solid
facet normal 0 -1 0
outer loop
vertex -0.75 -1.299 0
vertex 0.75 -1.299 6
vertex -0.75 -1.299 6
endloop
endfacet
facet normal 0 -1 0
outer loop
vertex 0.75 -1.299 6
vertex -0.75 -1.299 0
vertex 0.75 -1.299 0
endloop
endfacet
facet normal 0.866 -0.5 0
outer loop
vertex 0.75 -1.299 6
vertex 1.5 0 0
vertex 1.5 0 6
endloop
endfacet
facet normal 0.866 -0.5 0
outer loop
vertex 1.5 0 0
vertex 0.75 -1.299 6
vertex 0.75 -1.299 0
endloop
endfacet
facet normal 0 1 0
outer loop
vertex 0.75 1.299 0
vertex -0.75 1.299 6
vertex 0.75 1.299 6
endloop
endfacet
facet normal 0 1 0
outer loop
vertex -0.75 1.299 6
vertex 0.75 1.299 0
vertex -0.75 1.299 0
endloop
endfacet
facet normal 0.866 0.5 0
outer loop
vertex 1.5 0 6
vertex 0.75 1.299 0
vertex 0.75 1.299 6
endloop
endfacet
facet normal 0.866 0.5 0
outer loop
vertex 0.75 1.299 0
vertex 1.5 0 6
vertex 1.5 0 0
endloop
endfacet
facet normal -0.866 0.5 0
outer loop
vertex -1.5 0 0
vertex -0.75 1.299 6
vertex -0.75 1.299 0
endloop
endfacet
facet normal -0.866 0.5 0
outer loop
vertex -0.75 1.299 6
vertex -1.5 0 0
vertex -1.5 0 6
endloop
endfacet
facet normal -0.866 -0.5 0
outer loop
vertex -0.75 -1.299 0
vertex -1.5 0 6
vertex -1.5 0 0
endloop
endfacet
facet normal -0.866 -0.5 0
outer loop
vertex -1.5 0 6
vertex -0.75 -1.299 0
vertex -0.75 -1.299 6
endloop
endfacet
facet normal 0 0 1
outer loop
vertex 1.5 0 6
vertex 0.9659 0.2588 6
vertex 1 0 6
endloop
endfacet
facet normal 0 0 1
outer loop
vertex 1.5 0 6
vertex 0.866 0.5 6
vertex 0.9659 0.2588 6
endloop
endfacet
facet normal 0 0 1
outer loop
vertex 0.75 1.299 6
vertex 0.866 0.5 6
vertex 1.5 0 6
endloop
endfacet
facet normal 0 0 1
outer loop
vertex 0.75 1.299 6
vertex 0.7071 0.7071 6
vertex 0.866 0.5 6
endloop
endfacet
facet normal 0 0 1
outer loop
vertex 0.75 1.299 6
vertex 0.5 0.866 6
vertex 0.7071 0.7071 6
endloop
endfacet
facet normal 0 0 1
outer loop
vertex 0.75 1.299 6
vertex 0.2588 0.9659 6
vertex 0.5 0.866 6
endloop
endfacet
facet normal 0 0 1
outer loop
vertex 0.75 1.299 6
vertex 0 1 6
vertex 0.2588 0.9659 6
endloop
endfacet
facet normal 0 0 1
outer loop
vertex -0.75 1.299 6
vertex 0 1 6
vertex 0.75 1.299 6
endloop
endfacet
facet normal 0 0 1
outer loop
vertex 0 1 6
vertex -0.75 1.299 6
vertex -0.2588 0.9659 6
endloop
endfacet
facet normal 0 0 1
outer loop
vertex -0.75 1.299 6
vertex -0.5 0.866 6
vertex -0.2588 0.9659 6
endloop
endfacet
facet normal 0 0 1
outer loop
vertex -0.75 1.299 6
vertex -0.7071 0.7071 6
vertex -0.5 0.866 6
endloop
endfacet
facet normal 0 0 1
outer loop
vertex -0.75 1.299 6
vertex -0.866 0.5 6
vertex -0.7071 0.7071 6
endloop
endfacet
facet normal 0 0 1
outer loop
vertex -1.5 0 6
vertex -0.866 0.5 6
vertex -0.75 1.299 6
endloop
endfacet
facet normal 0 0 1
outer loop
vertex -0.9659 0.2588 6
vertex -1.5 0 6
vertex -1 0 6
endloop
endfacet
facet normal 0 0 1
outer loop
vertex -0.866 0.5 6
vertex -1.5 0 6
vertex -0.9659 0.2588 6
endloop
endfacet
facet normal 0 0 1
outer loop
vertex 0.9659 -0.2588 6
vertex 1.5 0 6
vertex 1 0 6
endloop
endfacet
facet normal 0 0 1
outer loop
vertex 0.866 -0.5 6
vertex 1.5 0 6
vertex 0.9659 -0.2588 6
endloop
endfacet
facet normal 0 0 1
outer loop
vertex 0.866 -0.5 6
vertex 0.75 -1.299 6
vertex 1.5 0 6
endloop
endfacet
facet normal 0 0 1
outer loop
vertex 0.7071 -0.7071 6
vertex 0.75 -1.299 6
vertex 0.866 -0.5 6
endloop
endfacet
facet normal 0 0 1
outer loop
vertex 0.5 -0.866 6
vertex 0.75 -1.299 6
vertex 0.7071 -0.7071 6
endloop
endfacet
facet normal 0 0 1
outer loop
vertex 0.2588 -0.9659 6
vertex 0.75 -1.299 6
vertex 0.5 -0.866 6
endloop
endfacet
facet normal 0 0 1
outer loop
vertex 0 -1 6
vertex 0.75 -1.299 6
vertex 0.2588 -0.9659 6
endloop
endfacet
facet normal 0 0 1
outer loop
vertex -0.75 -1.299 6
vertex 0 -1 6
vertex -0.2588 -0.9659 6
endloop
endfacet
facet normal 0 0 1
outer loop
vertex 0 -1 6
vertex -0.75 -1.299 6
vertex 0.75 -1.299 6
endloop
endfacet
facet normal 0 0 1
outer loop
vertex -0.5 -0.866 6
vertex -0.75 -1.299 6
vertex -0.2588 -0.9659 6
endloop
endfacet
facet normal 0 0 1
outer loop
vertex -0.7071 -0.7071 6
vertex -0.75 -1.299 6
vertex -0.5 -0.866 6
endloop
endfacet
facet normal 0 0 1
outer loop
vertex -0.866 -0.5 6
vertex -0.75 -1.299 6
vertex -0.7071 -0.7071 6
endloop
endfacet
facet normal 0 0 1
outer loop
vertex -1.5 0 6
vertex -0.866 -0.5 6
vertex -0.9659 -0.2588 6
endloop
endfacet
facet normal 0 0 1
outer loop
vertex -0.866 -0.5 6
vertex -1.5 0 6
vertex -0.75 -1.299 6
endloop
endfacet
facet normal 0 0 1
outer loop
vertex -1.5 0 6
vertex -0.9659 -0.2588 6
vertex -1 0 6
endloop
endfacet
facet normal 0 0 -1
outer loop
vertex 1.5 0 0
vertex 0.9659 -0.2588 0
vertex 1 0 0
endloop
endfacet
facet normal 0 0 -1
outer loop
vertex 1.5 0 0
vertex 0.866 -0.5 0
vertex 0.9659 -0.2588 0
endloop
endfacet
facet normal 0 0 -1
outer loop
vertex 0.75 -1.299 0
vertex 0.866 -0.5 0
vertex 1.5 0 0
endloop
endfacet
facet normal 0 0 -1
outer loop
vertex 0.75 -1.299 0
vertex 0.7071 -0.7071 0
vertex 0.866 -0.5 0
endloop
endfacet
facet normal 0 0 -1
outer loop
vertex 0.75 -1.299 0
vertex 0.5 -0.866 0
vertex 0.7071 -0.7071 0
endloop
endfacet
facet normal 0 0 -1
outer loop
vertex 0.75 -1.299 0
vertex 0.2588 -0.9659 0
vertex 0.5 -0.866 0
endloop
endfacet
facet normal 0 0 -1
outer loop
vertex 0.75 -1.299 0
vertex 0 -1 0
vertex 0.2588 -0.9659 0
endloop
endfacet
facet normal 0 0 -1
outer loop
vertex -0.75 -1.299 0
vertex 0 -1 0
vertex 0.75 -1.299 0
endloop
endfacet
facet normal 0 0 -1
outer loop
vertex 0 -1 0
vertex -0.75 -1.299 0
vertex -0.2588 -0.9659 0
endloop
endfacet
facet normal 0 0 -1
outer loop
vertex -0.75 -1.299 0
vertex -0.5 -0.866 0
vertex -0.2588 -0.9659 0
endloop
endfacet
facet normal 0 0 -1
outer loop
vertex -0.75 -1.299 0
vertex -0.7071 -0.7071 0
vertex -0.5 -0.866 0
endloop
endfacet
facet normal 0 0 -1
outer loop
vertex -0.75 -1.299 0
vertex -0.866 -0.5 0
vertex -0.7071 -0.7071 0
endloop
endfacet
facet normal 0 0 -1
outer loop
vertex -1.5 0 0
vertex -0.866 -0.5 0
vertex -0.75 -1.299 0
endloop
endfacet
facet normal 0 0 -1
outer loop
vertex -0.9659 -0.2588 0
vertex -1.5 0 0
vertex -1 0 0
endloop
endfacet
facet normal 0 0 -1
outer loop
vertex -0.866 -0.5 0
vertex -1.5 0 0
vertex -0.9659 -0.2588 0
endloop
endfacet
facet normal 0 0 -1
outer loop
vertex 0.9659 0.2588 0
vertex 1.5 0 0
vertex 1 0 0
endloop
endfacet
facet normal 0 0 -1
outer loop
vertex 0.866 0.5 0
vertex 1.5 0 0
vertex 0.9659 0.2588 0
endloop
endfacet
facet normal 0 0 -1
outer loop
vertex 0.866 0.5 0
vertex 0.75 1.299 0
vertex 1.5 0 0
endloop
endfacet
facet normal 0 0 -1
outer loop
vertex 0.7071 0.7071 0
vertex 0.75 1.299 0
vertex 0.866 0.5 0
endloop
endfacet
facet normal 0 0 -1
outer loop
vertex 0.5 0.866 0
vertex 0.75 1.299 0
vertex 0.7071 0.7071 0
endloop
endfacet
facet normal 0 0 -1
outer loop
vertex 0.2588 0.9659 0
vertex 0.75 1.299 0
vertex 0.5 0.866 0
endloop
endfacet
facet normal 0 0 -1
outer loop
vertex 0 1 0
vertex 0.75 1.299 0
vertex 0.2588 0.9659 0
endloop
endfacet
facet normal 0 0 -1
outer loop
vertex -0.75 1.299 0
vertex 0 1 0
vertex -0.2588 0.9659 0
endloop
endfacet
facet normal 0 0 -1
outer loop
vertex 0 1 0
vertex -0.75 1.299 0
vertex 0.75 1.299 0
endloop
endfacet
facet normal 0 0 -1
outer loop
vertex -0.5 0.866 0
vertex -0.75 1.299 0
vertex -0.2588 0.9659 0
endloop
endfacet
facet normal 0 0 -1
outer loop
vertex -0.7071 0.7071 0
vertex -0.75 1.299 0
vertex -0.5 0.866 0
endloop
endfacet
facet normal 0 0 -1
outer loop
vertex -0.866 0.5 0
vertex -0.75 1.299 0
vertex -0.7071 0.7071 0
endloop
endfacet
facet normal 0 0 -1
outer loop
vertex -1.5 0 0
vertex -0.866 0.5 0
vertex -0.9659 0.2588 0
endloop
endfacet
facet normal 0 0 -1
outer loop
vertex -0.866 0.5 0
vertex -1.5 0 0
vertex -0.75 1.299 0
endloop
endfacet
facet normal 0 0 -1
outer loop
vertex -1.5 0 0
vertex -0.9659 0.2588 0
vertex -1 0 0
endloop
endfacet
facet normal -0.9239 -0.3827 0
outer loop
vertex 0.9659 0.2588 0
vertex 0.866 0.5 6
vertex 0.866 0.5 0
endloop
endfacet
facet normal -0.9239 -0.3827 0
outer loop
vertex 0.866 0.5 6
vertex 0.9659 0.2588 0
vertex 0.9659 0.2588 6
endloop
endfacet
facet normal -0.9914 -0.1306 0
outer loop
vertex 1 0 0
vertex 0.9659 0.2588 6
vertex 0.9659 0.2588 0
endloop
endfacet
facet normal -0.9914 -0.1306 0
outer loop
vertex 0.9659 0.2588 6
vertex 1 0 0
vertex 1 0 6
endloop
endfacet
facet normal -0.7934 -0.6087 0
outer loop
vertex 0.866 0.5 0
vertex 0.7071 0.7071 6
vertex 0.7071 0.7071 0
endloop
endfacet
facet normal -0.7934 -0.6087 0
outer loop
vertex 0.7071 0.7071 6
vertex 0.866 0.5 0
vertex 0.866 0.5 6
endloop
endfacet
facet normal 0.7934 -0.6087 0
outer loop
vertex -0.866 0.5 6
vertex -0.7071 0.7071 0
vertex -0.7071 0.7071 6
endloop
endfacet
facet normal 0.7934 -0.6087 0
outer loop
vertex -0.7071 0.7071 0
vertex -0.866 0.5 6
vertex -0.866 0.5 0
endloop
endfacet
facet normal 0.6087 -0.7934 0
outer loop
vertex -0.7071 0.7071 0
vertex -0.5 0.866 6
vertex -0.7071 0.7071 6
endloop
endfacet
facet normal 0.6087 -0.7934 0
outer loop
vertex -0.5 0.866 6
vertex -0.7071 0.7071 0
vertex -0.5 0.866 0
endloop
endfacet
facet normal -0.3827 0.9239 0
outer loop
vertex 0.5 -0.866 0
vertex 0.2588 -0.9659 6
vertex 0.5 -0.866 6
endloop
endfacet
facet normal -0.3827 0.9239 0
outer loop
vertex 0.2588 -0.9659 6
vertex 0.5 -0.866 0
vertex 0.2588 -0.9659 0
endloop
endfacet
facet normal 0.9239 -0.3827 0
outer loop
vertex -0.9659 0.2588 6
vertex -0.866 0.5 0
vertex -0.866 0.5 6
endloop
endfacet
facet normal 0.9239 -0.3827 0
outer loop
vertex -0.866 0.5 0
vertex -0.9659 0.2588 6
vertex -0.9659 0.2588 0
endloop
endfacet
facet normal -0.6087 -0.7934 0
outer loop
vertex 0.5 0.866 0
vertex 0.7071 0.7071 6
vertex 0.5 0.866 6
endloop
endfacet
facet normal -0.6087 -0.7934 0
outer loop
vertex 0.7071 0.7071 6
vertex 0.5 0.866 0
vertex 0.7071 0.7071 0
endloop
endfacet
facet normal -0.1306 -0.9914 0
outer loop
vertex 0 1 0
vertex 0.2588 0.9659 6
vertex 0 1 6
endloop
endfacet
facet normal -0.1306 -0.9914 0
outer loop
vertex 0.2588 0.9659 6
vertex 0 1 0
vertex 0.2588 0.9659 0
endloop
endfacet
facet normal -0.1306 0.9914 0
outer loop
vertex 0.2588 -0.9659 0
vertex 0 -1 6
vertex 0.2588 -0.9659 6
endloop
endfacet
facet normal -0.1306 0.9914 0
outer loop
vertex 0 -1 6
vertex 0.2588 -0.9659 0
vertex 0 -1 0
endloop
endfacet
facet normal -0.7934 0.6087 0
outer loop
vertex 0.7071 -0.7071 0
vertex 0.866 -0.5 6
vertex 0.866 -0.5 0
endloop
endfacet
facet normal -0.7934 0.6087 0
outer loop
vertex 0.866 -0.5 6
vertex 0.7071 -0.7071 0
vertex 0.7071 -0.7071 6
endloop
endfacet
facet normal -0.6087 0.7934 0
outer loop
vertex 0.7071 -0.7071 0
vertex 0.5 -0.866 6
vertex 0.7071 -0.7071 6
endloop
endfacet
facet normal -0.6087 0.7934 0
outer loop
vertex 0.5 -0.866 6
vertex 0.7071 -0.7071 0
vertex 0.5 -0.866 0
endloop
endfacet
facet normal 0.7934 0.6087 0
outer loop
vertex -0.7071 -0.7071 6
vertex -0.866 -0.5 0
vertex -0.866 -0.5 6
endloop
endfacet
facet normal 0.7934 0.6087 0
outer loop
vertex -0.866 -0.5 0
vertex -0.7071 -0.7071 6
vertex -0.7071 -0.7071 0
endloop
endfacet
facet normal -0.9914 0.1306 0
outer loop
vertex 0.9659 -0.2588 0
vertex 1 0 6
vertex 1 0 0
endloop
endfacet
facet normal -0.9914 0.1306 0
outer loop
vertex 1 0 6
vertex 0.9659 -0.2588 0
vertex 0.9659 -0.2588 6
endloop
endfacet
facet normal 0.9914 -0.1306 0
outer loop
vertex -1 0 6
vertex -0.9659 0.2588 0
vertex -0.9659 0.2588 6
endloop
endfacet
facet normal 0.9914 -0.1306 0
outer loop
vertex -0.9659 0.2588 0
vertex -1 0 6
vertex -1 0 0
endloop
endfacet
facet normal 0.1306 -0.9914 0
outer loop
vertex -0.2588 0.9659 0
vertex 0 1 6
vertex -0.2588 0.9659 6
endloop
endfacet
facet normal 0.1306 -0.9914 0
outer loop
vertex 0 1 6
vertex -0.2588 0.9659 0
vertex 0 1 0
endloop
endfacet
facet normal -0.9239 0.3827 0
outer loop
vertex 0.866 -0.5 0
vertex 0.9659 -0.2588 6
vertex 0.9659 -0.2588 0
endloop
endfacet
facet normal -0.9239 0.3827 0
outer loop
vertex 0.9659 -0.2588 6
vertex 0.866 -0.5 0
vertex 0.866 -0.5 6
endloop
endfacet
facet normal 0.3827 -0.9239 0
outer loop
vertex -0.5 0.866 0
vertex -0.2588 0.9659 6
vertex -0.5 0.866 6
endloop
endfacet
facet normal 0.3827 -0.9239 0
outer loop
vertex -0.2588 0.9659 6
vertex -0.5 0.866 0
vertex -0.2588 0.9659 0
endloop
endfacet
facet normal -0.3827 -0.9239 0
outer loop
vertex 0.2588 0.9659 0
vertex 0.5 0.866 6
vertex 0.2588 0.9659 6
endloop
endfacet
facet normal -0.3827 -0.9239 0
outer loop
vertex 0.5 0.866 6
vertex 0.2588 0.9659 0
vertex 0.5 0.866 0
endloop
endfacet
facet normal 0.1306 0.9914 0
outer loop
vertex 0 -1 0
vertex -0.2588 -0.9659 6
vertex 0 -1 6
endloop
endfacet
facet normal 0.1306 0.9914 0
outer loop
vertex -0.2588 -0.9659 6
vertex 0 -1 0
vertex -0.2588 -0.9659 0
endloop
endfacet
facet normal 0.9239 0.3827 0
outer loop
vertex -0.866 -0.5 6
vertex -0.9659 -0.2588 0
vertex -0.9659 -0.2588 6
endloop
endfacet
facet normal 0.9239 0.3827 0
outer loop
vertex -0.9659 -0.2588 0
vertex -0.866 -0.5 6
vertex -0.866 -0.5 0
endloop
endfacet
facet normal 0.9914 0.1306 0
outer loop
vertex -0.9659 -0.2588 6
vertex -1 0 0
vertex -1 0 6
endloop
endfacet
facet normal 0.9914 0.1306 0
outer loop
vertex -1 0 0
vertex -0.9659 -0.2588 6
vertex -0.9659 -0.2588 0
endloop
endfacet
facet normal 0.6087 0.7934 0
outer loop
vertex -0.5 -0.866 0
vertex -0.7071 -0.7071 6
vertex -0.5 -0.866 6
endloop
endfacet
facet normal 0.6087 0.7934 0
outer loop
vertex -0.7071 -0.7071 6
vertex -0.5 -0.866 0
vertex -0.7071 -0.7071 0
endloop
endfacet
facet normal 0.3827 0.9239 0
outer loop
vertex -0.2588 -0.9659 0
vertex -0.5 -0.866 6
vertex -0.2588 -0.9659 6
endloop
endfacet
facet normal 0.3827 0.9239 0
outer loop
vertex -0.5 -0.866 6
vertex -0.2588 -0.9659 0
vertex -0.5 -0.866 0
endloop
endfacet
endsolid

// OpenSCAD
difference()
{
    cylinder(d=3,h=6,$fn=6);
    translate([0,0,-1])cylinder(d=2,h=8,$fn=24);
}
